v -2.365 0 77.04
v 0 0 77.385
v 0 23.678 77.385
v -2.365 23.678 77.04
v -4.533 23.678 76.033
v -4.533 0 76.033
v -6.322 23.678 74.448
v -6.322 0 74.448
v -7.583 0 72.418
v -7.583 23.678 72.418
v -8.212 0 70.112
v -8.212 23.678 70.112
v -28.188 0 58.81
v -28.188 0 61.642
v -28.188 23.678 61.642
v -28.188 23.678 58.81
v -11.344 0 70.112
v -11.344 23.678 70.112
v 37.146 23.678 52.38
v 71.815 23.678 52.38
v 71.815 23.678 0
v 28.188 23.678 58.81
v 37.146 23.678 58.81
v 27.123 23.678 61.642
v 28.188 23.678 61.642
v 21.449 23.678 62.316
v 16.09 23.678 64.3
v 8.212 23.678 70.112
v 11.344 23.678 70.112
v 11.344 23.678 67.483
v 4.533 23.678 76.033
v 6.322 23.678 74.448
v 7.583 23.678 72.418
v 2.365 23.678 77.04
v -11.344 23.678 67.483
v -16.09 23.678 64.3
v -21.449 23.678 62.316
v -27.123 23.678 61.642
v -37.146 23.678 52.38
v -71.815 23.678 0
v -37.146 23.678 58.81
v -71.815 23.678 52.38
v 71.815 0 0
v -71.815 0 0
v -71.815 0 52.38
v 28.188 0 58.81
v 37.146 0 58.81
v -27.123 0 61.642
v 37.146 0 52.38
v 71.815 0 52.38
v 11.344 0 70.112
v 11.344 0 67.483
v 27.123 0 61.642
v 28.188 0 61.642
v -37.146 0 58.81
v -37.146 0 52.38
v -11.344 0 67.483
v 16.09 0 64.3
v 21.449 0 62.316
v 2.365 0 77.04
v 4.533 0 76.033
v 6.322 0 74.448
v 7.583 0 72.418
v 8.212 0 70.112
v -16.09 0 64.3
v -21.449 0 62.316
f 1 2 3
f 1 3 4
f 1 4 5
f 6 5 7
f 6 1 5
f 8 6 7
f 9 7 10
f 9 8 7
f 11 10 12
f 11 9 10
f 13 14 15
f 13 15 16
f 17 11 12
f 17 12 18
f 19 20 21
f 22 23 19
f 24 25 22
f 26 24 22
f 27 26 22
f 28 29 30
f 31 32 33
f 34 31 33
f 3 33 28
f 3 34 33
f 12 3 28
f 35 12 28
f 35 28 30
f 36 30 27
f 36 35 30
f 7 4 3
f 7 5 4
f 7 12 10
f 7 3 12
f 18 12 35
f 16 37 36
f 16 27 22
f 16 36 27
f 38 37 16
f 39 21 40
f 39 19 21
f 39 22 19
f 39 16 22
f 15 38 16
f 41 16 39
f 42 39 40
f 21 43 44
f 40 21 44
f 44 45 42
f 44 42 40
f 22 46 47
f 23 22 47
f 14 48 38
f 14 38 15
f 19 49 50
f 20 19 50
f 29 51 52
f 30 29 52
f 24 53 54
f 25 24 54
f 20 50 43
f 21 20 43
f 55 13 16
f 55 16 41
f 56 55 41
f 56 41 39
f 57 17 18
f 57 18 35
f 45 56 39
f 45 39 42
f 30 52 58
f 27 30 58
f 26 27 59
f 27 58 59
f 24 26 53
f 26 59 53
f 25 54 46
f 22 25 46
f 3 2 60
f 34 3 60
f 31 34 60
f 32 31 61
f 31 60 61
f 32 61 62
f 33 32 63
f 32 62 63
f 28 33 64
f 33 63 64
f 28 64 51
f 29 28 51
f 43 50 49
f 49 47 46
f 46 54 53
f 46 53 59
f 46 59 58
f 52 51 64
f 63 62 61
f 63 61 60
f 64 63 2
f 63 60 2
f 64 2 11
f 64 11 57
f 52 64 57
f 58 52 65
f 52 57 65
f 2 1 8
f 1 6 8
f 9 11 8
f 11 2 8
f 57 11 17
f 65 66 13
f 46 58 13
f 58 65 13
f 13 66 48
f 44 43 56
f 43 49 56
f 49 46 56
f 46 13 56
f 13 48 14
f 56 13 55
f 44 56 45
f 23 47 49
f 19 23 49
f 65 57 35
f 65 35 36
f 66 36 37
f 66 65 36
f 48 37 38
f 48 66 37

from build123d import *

# Parameters (mm, degrees)
F1_DEPTH = 23.67751


with BuildPart() as f1:
    # F0 (on Front) → F1 (new body)
    with BuildSketch(Plane.XZ):
        with BuildLine():
            Line((-71.815483, 52.379653), (-71.815483, 0))
            Line((-71.815483, 0), (0, 0))
            Line((0, 0), (0, 77.384859))
            ThreePointArc((0, 77.384859), (-5.48468, 75.305304), (-8.211866, 70.112161))
            Line((-8.211866, 70.112161), (-11.343726, 70.112161))
            Line((-11.343726, 70.112161), (-11.343726, 67.48306))
            ThreePointArc((-11.343726, 67.48306), (-18.710491, 63.14941), (-27.123494, 61.64239))
            Line((-27.123494, 61.64239), (-28.187953, 61.64239))
            Line((-28.187953, 61.64239), (-28.187953, 58.809962))
            Line((-28.187953, 58.809962), (-37.14551, 58.809962))
            Line((-37.14551, 58.809962), (-37.14551, 52.379653))
            Line((-37.14551, 52.379653), (-71.815483, 52.379653))
        make_face()
    extrude(amount=-F1_DEPTH)

    # F2: F1 across plane


with BuildPart() as f1_1:
    add(f1.part)
    add(f1.part.mirror(Plane.YZ))


solid = f1_1.part
